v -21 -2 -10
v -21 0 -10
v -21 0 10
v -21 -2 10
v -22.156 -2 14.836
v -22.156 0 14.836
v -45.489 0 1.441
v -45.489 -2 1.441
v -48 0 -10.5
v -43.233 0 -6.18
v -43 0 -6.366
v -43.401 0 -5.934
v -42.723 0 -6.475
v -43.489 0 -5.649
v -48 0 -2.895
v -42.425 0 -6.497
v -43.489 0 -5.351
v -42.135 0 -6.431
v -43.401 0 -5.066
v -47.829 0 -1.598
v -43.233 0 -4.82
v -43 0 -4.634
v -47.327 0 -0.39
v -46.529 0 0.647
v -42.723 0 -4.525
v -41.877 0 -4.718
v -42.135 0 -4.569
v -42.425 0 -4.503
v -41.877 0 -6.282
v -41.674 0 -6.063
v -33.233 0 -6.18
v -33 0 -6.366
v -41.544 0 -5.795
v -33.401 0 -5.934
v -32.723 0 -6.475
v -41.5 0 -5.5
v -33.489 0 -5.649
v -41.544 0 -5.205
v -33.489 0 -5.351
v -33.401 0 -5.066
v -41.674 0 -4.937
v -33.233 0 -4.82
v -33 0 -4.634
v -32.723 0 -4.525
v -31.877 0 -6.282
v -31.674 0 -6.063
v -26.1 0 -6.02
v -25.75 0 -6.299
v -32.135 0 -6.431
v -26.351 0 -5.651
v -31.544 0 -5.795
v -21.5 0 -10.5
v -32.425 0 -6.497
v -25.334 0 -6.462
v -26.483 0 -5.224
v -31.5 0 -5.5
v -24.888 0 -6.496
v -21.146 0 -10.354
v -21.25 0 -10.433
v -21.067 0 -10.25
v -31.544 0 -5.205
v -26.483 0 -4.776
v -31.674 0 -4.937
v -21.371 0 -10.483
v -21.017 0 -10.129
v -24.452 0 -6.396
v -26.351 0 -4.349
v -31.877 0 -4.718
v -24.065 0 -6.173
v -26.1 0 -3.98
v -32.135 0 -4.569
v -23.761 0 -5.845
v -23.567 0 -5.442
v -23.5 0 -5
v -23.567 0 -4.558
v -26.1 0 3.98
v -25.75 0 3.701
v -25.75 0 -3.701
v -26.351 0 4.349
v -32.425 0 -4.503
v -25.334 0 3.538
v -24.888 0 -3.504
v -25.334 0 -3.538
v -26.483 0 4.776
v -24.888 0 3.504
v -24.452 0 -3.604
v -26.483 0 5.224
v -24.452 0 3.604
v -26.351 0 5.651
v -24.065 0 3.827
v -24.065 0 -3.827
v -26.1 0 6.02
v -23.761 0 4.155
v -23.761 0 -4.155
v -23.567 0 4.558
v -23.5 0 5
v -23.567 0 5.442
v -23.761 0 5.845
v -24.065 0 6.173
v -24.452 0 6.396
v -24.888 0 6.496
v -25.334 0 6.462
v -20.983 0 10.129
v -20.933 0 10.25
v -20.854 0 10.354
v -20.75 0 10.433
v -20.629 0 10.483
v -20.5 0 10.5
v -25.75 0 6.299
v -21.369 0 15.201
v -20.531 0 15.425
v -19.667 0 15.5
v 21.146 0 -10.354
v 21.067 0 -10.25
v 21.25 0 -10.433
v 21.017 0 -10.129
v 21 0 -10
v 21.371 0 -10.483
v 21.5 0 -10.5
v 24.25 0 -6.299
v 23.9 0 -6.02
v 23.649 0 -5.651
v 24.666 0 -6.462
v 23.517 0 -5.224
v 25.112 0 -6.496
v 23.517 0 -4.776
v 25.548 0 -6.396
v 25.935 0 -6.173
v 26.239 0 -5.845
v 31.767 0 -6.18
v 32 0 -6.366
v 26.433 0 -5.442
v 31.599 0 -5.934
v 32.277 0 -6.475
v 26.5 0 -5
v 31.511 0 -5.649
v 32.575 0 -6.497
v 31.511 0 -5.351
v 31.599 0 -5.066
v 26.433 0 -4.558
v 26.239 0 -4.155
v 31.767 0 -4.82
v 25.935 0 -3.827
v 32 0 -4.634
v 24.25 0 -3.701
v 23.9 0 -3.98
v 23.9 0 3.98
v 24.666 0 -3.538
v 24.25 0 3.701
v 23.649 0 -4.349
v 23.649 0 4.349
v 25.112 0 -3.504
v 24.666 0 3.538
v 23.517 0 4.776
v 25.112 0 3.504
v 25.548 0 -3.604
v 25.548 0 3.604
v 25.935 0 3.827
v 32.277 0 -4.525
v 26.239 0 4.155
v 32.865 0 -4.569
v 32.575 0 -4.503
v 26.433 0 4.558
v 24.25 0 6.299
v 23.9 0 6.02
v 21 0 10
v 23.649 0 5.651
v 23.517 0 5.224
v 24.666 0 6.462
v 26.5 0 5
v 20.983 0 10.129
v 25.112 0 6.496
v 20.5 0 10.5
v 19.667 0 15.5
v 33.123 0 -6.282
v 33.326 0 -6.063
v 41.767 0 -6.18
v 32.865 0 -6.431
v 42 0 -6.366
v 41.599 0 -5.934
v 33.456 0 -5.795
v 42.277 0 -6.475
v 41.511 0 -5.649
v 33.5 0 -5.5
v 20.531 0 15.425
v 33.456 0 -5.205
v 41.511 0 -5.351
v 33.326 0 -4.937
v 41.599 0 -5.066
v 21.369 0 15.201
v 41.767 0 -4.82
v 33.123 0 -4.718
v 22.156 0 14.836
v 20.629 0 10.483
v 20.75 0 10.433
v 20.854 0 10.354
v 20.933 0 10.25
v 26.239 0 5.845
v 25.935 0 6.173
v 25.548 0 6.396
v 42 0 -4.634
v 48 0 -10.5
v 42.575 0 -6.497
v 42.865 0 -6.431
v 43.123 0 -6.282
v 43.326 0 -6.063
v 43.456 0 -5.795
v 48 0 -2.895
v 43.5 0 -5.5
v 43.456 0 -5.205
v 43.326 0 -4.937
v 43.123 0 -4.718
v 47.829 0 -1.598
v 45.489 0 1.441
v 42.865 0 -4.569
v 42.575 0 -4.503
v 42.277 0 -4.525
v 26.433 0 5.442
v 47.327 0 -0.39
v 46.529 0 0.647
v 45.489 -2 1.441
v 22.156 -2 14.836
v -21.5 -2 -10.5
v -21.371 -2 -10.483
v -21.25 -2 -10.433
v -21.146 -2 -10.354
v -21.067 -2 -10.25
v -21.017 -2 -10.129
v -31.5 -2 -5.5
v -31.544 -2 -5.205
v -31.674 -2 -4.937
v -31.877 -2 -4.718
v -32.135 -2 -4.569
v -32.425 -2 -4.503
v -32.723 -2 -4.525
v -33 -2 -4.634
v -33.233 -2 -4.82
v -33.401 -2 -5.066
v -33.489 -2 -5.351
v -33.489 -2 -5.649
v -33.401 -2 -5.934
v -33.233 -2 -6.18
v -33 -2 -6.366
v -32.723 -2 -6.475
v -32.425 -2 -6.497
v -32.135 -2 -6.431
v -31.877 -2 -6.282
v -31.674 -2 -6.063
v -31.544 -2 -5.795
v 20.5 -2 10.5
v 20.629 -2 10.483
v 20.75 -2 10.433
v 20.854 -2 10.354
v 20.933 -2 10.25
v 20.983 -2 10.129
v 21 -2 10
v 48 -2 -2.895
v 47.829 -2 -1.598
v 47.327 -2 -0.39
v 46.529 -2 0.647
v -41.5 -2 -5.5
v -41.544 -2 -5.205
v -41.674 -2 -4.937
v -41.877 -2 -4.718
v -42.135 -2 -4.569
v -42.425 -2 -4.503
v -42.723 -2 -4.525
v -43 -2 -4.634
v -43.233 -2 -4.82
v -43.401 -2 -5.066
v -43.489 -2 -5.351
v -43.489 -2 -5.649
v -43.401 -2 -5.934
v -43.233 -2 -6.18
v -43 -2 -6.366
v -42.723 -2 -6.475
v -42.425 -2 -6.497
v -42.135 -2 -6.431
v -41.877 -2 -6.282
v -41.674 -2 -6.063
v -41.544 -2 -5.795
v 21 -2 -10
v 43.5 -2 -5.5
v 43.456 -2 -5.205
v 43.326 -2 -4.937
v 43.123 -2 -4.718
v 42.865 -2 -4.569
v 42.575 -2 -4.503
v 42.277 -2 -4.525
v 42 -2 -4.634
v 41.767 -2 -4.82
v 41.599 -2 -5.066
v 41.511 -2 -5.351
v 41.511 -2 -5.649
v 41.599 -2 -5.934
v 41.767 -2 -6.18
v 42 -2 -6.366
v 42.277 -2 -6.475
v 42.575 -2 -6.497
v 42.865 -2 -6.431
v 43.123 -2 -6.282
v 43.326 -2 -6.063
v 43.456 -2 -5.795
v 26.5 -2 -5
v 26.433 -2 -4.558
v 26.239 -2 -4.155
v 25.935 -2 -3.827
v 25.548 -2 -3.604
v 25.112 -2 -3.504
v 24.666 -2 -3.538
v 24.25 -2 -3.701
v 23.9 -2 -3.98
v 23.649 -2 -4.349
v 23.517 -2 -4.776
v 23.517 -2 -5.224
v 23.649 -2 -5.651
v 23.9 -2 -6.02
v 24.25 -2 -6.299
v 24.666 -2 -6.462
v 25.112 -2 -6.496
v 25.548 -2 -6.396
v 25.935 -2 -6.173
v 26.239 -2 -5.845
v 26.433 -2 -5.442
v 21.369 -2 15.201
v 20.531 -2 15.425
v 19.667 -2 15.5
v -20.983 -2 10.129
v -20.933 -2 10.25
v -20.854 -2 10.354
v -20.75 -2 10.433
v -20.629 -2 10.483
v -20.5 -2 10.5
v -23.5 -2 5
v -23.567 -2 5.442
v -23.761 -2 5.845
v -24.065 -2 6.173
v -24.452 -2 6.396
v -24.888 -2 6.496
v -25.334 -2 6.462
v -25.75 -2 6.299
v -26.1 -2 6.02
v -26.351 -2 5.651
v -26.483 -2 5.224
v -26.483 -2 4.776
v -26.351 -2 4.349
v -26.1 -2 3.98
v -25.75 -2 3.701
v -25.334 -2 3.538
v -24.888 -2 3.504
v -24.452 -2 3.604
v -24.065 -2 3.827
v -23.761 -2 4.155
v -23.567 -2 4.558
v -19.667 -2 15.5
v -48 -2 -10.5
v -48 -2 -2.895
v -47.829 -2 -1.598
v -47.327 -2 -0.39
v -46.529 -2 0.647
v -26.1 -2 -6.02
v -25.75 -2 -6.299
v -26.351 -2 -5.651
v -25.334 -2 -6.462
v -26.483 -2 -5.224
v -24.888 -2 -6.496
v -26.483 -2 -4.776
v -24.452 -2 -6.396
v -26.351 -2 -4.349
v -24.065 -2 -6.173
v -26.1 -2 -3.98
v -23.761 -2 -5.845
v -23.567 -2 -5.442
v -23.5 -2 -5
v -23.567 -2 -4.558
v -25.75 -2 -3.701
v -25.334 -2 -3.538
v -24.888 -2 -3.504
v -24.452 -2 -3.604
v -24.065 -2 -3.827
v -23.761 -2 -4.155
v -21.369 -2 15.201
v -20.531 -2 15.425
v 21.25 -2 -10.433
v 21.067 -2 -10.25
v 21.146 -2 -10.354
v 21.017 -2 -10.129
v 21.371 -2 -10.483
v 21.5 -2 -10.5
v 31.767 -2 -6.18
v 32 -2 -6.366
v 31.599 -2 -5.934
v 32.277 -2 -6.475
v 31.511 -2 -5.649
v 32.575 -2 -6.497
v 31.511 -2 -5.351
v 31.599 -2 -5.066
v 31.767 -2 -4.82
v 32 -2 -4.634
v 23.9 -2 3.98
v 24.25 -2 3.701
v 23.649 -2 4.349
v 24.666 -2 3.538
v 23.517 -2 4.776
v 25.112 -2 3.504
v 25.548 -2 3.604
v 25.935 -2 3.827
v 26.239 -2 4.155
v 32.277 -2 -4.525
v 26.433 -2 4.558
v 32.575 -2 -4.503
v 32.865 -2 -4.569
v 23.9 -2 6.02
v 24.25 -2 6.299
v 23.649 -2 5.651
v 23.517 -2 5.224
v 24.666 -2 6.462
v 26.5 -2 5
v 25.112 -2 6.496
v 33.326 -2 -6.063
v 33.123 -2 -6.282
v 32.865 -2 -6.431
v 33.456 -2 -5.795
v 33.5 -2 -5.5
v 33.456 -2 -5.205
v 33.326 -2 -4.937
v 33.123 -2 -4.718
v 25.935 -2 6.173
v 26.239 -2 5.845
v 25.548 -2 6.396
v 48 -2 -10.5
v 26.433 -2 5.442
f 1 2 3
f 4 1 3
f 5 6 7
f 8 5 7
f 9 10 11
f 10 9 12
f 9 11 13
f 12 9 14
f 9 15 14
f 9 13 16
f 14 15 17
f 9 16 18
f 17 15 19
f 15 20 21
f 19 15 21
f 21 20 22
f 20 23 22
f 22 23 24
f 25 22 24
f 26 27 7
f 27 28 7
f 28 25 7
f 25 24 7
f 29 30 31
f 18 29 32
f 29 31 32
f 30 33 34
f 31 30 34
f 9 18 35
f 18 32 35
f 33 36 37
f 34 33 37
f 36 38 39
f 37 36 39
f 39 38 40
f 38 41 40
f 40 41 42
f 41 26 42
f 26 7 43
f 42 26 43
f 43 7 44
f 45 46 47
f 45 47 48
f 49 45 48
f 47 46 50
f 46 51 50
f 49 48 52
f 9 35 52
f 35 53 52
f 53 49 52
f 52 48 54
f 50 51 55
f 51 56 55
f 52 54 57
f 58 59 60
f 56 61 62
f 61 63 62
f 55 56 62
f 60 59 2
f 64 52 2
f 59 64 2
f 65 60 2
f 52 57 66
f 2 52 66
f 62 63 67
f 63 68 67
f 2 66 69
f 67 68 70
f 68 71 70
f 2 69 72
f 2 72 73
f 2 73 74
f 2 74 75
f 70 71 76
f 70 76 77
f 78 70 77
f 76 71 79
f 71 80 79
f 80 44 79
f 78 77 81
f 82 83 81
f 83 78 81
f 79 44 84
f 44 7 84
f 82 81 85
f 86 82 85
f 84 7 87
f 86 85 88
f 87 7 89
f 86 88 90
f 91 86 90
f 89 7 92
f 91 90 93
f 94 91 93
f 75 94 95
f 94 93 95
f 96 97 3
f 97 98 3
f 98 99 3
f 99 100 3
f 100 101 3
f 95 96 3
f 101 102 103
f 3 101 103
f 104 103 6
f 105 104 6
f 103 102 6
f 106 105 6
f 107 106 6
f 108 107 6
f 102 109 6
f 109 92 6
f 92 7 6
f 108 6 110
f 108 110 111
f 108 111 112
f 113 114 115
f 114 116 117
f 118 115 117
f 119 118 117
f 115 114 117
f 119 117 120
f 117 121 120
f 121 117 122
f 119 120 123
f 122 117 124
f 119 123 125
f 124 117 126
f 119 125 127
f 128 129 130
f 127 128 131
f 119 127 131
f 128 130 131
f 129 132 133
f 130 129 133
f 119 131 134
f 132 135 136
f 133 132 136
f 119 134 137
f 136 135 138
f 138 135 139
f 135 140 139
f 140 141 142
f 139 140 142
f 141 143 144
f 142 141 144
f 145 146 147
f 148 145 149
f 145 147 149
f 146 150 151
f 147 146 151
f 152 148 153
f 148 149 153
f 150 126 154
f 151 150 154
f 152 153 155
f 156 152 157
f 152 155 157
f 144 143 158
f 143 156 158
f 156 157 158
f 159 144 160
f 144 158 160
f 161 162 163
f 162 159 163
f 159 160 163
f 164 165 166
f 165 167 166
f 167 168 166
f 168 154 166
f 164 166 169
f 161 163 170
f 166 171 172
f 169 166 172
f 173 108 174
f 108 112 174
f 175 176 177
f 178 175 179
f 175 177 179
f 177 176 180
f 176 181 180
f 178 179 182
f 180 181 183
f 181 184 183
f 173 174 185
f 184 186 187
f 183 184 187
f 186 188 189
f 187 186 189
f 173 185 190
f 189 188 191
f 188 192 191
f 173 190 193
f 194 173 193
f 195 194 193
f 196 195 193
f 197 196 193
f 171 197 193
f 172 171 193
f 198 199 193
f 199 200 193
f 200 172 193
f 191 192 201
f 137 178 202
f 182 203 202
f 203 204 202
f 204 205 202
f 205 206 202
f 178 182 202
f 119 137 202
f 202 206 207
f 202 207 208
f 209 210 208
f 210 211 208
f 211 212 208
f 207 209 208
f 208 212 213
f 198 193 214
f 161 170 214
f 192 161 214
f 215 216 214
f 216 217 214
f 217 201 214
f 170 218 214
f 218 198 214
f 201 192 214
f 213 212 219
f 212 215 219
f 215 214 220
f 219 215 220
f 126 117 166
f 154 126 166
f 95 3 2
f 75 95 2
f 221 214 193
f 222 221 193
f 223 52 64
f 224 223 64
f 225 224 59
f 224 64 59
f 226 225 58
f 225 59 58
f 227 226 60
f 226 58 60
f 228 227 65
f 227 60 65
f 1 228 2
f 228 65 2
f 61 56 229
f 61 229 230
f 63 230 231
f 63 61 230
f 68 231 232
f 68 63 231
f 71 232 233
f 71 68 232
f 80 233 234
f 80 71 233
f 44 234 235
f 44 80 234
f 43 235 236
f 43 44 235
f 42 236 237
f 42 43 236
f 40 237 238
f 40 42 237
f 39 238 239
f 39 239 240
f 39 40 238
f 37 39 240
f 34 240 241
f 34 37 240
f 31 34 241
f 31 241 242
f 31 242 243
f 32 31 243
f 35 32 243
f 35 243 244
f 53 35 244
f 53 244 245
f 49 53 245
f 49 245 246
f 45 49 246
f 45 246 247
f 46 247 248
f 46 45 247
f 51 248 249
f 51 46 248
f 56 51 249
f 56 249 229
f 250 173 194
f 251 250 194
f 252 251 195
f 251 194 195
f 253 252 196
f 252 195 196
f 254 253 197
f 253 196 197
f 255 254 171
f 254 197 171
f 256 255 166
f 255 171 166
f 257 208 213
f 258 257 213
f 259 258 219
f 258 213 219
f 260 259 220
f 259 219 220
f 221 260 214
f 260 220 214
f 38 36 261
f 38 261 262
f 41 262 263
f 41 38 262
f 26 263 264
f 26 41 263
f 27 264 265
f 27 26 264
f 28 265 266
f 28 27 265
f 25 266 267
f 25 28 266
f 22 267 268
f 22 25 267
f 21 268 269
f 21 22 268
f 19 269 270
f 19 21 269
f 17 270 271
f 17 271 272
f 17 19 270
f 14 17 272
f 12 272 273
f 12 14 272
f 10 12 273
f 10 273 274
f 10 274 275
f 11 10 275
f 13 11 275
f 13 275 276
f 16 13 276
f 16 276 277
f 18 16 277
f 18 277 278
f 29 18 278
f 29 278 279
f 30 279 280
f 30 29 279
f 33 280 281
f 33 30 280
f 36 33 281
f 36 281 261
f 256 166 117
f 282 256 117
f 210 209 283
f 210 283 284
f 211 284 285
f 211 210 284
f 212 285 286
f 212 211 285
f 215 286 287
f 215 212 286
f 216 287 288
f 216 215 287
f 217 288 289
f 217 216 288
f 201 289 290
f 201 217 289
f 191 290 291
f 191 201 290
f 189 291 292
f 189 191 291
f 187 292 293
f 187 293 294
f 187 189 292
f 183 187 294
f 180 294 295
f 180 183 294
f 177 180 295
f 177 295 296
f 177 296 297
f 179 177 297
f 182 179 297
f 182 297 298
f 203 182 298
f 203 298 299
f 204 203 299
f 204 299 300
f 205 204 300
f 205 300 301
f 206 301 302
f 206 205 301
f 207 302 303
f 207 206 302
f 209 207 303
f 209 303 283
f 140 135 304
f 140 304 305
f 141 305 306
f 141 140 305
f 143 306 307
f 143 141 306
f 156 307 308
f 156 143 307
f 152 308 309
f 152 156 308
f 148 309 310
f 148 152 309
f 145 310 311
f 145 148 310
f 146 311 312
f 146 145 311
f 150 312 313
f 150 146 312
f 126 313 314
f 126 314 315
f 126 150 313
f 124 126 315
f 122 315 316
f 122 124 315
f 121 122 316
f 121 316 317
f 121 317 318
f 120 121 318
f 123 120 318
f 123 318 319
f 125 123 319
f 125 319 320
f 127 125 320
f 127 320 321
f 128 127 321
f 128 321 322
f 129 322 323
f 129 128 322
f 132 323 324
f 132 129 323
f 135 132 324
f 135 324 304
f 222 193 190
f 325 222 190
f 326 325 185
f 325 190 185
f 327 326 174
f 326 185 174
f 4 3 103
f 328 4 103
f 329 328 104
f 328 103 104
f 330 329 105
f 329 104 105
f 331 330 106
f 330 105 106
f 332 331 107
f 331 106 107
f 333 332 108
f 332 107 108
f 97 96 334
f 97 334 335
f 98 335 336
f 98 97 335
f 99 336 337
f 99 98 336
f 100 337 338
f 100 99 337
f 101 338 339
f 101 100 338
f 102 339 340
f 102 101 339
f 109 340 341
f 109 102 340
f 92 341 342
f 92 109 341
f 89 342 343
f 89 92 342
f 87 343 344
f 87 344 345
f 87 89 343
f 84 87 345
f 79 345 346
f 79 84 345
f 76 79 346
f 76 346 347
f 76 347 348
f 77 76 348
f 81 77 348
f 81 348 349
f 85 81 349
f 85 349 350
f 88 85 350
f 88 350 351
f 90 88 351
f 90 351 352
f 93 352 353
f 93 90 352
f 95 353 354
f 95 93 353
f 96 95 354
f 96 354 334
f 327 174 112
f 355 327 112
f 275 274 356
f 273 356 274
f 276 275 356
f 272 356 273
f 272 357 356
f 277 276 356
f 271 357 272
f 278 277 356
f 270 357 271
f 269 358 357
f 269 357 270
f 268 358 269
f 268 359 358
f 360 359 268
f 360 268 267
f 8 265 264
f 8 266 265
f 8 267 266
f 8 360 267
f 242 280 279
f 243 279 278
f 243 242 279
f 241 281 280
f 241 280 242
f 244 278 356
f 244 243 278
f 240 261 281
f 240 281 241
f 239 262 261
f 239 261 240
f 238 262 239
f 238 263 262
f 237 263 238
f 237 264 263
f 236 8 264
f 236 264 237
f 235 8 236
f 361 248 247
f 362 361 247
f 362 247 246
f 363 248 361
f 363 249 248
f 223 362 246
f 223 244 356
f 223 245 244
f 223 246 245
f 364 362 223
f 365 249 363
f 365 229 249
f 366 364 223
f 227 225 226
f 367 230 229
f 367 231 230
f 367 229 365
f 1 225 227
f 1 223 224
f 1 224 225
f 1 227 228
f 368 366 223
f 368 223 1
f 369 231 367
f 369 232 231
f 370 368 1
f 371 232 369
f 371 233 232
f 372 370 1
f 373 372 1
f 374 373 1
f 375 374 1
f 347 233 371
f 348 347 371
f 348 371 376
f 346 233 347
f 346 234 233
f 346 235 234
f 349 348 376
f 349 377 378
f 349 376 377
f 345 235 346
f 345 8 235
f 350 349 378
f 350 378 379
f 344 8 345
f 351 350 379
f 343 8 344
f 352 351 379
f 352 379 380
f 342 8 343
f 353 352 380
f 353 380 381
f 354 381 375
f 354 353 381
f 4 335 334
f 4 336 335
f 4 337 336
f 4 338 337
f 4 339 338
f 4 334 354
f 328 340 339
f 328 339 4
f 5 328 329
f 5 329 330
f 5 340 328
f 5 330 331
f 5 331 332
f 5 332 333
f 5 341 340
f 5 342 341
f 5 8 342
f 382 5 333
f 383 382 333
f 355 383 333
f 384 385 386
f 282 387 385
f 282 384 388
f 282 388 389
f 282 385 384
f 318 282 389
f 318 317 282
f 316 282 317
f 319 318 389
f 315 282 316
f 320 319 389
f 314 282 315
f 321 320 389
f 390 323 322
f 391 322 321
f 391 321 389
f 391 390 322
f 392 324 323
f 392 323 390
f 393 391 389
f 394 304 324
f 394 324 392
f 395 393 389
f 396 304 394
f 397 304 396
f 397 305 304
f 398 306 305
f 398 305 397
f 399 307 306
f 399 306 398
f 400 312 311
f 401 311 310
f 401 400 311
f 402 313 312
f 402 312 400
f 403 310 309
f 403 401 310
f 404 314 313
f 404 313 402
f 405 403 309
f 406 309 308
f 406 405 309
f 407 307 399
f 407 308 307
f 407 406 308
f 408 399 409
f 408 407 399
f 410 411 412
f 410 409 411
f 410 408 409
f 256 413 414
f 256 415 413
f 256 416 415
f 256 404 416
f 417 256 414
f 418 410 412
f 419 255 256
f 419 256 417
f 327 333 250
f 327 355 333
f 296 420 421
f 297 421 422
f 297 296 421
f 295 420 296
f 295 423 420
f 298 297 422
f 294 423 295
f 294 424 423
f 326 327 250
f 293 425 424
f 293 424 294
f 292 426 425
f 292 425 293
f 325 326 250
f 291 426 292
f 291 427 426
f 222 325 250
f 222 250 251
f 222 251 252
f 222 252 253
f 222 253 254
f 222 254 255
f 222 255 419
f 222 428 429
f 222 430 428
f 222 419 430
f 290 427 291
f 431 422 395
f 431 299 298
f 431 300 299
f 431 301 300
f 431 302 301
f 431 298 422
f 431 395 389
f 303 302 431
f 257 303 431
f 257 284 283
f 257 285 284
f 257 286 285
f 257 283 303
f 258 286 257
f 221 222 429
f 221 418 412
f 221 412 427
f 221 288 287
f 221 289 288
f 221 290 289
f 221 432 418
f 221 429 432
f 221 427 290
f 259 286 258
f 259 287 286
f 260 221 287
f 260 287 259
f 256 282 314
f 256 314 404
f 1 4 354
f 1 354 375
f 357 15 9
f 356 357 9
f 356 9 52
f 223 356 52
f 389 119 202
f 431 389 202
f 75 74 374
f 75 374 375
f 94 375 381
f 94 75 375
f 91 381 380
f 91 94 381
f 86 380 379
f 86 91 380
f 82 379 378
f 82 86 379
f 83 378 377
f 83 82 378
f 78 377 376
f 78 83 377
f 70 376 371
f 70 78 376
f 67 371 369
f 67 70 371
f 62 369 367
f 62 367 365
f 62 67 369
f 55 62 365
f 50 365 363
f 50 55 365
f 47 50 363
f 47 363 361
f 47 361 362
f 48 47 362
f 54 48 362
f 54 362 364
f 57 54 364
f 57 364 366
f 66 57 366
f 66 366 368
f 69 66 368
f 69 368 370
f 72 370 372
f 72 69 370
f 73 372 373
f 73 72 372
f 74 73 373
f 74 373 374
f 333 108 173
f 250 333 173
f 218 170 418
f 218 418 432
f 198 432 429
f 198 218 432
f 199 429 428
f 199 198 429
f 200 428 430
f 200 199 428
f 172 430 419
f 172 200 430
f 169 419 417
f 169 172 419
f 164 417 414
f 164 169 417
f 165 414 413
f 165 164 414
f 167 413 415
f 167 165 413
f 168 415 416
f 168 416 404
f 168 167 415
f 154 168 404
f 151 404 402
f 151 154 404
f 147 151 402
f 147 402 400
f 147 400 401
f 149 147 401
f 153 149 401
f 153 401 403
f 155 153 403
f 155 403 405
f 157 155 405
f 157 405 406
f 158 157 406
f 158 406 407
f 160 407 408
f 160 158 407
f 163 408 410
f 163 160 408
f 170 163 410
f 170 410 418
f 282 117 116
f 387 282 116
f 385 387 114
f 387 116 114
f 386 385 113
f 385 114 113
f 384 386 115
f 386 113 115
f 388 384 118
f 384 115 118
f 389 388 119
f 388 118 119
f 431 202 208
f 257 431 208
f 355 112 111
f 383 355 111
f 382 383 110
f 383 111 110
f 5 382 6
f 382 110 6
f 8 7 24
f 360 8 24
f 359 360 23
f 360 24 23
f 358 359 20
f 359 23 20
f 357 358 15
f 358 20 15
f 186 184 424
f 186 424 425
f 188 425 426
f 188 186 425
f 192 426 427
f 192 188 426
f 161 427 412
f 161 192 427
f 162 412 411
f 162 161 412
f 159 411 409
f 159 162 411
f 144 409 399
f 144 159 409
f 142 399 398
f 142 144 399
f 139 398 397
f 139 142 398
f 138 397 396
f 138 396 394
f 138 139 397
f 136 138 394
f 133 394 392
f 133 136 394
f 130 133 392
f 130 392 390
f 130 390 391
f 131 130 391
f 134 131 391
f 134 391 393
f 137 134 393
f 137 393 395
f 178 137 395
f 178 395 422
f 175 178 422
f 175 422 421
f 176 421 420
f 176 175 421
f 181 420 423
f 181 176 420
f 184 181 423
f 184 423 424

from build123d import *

# Parameters (mm, degrees)
F0_R     = 1
F0_R_2   = 1.5
F1_DEPTH = 2


with BuildPart() as f1:
    # F0 (on Front) → F1 (new body)
    with BuildSketch(Plane.XZ):
        with BuildLine():
            ThreePointArc((-21, 10), (-20.853553, 10.353553), (-20.5, 10.5))
            Line((-20.5, 10.5), (20.5, 10.5))
            ThreePointArc((20.5, 10.5), (20.853553, 10.353553), (21, 10))
            Line((21, 10), (21, -10))
            ThreePointArc((21, -10), (21.146447, -10.353553), (21.5, -10.5))
            Line((21.5, -10.5), (30, -10.5))
            Line((30, -10.5), (45, -10.5))
            Line((45, -10.5), (48, -10.5))
            Line((48, -10.5), (48, -2.894959))
            ThreePointArc((48, -2.894959), (47.327048, -0.389634), (45.489338, 1.441306))
            Line((45.489338, 1.441306), (22.156183, 14.836265))
            ThreePointArc((22.156183, 14.836265), (20.954997, 15.331218), (19.666845, 15.5))
            Line((19.666845, 15.5), (0, 15.5))
            Line((0, 15.5), (-19.666845, 15.5))
            ThreePointArc((-19.666845, 15.5), (-20.954997, 15.331218), (-22.156183, 14.836265))
            Line((-22.156183, 14.836265), (-45.489338, 1.441306))
            ThreePointArc((-45.489338, 1.441306), (-47.327048, -0.389634), (-48, -2.894959))
            Line((-48, -2.894959), (-48, -10.5))
            Line((-48, -10.5), (-45, -10.5))
            Line((-45, -10.5), (-30, -10.5))
            Line((-30, -10.5), (-21.5, -10.5))
            ThreePointArc((-21.5, -10.5), (-21.146447, -10.353553), (-21, -10))
            Line((-21, -10), (-21, 10))
        make_face()
        with Locations((-42.5, -5.5)):
            Circle(F0_R, mode=Mode.SUBTRACT)
        with Locations((-32.5, -5.5)):
            Circle(F0_R, mode=Mode.SUBTRACT)
        with Locations((-25, -5)):
            Circle(F0_R_2, mode=Mode.SUBTRACT)
        with Locations((25, -5)):
            Circle(F0_R_2, mode=Mode.SUBTRACT)
        with Locations((32.5, -5.5)):
            Circle(F0_R, mode=Mode.SUBTRACT)
        with Locations((42.5, -5.5)):
            Circle(F0_R, mode=Mode.SUBTRACT)
        with Locations((-25, 5)):
            Circle(F0_R_2, mode=Mode.SUBTRACT)
        with Locations((25, 5)):
            Circle(F0_R_2, mode=Mode.SUBTRACT)
    extrude(amount=F1_DEPTH)


solid = f1.part
